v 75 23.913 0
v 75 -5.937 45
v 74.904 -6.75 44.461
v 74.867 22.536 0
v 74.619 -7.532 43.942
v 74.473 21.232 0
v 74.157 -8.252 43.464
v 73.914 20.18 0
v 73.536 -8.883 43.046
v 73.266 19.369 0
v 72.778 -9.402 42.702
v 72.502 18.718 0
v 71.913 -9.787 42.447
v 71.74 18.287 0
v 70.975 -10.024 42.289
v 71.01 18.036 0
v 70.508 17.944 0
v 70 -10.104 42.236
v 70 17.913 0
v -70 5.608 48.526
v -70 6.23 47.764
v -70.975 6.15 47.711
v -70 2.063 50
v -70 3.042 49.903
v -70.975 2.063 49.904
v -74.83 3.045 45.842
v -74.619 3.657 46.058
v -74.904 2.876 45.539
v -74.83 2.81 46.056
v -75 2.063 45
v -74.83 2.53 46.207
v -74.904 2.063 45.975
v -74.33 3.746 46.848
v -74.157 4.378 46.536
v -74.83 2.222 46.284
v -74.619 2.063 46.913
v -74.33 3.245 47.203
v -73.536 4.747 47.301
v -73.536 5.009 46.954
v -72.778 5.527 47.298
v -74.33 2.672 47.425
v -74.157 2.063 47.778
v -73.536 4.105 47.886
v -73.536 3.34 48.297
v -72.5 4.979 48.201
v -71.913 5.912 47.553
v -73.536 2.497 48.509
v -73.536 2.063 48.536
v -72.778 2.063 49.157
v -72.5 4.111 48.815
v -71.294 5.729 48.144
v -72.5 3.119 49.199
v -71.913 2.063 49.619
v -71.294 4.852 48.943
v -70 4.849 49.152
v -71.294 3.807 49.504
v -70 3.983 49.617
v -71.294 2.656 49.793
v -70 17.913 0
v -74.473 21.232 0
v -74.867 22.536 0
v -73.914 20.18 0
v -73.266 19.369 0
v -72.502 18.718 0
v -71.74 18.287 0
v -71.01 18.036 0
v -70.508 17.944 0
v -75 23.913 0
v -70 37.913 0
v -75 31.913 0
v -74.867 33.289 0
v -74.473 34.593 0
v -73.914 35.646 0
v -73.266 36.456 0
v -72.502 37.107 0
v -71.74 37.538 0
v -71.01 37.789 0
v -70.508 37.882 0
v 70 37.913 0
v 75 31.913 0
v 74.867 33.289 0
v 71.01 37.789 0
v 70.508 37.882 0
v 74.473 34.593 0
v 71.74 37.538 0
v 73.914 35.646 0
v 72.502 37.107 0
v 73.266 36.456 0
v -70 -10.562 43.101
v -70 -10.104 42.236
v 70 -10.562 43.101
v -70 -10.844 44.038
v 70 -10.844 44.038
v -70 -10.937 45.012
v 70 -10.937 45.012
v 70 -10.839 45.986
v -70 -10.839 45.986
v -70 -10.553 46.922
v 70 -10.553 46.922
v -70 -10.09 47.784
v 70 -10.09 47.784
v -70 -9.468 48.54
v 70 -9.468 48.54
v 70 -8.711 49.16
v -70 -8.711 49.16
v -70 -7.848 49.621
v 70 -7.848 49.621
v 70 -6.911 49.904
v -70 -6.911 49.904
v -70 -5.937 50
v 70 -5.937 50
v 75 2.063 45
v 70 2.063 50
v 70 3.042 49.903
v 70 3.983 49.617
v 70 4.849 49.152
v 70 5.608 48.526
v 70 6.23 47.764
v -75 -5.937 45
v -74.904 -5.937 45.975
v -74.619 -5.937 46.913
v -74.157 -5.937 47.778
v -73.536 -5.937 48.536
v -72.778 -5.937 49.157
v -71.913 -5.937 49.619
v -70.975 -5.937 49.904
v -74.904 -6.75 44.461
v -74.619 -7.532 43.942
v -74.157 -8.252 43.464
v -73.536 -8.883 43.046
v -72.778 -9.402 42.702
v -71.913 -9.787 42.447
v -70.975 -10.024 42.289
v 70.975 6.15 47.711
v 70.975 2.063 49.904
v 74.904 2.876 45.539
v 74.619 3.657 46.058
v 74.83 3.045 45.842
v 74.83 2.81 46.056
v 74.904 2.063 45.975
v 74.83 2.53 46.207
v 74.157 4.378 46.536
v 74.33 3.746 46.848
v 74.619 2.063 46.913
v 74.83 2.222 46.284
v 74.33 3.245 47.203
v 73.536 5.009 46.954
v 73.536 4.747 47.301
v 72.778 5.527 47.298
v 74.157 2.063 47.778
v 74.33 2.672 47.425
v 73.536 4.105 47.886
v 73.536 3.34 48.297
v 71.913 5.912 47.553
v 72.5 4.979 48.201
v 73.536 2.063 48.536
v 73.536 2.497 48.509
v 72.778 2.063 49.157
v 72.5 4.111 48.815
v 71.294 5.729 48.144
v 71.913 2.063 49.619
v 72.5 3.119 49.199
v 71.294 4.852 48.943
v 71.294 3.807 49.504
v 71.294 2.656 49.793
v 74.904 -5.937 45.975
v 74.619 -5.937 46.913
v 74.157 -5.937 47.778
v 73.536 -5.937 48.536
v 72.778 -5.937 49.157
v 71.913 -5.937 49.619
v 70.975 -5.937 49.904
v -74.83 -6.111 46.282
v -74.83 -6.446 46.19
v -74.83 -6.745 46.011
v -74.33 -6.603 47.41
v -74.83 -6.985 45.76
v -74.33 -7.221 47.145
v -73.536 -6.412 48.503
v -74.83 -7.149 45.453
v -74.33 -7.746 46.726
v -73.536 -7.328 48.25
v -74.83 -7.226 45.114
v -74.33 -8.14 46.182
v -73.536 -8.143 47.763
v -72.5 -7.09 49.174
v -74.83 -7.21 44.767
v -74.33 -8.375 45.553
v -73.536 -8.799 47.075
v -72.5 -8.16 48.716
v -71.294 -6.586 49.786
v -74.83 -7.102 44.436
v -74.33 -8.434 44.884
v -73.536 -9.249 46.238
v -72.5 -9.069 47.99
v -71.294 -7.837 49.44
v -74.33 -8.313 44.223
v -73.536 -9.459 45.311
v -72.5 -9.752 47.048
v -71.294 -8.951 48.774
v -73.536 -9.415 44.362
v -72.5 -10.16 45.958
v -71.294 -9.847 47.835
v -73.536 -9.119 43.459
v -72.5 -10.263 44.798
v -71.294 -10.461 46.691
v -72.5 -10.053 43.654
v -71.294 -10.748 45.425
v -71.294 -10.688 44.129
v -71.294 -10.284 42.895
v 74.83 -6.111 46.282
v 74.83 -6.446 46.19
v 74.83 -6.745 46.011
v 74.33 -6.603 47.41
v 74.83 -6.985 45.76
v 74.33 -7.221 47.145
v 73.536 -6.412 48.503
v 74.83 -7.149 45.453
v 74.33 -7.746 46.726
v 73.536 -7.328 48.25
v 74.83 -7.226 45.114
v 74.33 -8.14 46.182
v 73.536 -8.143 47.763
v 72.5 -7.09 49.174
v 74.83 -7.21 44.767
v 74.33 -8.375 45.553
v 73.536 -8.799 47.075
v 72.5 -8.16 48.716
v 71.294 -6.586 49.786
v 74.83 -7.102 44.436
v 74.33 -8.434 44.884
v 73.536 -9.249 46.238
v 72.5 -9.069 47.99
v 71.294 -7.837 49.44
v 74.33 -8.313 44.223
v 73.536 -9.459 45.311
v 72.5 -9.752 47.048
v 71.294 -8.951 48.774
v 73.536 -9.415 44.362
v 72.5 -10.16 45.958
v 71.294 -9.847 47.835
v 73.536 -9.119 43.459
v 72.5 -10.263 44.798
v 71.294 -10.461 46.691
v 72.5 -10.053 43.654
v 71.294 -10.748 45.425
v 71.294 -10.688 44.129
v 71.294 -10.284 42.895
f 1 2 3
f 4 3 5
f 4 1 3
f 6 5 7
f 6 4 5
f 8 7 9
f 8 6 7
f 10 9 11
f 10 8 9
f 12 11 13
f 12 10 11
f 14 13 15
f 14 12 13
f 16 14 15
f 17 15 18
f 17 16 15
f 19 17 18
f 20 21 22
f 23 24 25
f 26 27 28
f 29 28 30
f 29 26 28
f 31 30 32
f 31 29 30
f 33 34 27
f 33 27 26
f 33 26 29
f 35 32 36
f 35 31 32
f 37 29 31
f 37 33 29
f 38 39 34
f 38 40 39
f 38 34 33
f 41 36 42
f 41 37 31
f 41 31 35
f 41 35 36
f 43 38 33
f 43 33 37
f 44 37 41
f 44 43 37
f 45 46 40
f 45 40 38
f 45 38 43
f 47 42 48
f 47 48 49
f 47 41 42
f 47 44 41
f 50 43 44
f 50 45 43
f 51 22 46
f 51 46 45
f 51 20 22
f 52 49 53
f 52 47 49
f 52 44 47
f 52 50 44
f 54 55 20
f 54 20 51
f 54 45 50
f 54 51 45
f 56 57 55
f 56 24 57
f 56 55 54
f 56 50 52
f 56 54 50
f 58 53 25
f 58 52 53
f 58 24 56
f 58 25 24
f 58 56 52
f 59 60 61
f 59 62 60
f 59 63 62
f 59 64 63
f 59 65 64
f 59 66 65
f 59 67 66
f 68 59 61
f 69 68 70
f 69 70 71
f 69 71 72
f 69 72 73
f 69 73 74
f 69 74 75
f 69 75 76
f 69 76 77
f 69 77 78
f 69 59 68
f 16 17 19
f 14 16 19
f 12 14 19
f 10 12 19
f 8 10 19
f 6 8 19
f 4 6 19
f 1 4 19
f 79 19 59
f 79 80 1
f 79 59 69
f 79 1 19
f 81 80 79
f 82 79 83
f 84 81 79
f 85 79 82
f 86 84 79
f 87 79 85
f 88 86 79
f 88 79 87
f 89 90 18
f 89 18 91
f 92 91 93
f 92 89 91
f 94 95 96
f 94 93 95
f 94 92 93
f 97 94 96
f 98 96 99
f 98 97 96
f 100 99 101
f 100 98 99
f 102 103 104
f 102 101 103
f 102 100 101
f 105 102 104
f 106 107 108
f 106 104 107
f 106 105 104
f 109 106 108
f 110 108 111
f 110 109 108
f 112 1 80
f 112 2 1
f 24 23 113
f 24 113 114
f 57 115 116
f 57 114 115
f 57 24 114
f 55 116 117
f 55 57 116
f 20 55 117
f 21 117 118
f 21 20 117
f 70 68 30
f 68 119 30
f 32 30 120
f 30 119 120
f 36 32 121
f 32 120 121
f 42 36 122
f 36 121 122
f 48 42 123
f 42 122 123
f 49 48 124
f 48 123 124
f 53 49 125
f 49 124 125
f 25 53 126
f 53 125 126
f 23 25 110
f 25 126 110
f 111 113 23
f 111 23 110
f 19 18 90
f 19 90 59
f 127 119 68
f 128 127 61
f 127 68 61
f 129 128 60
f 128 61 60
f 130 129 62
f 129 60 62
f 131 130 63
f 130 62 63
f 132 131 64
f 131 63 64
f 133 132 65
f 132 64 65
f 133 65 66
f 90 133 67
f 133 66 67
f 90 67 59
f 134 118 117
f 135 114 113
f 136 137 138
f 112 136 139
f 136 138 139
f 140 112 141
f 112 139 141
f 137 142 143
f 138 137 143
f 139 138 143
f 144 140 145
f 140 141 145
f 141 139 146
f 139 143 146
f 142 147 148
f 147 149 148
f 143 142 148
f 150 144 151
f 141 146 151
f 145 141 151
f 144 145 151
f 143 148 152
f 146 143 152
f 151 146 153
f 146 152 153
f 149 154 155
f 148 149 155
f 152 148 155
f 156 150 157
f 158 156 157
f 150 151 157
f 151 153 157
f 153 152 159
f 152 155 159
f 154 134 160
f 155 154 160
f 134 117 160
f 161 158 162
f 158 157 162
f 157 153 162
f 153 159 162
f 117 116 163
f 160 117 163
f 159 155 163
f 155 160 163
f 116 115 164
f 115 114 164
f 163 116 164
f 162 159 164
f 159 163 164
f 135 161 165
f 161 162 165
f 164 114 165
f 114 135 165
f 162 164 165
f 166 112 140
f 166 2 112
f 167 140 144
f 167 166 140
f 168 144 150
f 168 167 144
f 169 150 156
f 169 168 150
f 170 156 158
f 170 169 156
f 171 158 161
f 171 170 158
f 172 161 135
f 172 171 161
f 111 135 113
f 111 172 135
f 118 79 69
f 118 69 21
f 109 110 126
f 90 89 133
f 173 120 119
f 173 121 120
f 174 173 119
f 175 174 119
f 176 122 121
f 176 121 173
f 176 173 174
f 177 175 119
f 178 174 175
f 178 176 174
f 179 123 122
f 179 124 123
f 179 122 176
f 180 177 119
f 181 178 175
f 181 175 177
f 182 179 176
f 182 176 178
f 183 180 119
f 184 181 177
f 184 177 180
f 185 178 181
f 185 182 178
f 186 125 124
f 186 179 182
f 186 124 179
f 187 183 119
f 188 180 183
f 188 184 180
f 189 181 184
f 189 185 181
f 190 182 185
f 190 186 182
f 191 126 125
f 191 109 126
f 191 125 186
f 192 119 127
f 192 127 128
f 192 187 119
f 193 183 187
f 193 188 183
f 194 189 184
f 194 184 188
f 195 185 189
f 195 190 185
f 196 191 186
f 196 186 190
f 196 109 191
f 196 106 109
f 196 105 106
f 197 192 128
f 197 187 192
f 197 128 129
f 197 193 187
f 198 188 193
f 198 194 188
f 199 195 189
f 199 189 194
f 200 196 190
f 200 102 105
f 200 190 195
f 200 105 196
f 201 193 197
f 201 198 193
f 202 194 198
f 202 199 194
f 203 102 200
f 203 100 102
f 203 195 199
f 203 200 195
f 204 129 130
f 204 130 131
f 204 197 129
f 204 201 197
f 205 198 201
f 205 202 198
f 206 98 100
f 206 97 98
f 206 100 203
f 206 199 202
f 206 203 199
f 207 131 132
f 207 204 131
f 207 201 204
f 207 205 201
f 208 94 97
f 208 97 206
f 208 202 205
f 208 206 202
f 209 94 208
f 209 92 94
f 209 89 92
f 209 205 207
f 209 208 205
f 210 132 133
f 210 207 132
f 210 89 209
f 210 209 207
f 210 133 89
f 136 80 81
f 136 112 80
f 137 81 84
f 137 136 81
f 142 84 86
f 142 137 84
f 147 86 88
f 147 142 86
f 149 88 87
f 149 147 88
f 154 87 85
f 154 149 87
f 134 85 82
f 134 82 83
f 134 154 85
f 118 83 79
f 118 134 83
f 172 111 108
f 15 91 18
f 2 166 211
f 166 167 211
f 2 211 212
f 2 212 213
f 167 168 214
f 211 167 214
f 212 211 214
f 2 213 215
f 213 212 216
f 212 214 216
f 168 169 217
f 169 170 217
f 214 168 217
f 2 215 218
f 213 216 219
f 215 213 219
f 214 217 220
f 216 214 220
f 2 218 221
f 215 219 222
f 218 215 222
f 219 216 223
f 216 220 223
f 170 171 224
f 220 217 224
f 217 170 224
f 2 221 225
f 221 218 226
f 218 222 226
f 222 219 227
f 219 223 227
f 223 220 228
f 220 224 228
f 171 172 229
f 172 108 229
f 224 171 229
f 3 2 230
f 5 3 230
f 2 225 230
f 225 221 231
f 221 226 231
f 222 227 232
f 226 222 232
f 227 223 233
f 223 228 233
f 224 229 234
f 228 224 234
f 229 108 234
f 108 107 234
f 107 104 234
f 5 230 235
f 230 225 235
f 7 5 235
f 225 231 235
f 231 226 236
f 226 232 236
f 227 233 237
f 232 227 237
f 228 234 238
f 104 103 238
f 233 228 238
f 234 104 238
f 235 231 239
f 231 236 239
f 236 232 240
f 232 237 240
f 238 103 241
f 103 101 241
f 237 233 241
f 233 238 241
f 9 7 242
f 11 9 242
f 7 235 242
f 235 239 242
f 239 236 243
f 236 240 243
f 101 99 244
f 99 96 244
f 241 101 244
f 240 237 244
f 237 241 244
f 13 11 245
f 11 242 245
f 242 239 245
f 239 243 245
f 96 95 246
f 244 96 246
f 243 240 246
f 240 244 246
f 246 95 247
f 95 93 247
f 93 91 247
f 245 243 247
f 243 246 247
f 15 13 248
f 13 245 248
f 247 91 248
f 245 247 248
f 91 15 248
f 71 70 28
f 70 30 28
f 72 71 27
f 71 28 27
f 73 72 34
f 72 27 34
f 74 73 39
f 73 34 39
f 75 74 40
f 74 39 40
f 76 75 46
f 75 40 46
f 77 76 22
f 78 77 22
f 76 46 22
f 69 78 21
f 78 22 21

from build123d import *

# Parameters (mm, degrees)
F1_DEPTH = 75
F2_F1_R  = 5
F2_F2_R  = 5
F2_F3_R  = 5
F2_F4_R  = 5


# Not quite as in the source:
# - a feature of the source that left no trace in its solid (it failed there, or was rolled back) is left out


with BuildPart() as f1:
    # F0 (on Right) → F1 (new body, symmetric)
    with BuildSketch(Plane.YZ):
        Polygon((-15.2537021786, 50), (17.912545725, 0), (37.912545725, 0), (4.7462978214, 50), align=None)
    extrude(amount=F1_DEPTH, both=True)

    # F2: fillet of radius 5 on 4 edges, made by hand

    # F2_f1
    f2_f1_edges = [f1.edges().sort_by_distance(p)[0] for p in [
        (0, -15.2537021786, 50),
    ]]
    fillet(f2_f1_edges, radius=F2_F1_R)

    # F2_f2
    f2_f2_edges = [f1.edges().sort_by_distance(p)[0] for p in [
        (0, 4.7462978214, 50),
    ]]
    fillet(f2_f2_edges, radius=F2_F2_R)

    # F2_f3
    f2_f3_edges = [f1.edges().sort_by_distance(p)[0] for p in [
        (-75, -1.9370773882, 50),
    ]]
    fillet(f2_f3_edges, radius=F2_F3_R)

    # F2_f4
    f2_f4_edges = [f1.edges().sort_by_distance(p)[0] for p in [
        (75, -1.9370773882, 50),
    ]]
    fillet(f2_f4_edges, radius=F2_F4_R)


solid = f1.part
